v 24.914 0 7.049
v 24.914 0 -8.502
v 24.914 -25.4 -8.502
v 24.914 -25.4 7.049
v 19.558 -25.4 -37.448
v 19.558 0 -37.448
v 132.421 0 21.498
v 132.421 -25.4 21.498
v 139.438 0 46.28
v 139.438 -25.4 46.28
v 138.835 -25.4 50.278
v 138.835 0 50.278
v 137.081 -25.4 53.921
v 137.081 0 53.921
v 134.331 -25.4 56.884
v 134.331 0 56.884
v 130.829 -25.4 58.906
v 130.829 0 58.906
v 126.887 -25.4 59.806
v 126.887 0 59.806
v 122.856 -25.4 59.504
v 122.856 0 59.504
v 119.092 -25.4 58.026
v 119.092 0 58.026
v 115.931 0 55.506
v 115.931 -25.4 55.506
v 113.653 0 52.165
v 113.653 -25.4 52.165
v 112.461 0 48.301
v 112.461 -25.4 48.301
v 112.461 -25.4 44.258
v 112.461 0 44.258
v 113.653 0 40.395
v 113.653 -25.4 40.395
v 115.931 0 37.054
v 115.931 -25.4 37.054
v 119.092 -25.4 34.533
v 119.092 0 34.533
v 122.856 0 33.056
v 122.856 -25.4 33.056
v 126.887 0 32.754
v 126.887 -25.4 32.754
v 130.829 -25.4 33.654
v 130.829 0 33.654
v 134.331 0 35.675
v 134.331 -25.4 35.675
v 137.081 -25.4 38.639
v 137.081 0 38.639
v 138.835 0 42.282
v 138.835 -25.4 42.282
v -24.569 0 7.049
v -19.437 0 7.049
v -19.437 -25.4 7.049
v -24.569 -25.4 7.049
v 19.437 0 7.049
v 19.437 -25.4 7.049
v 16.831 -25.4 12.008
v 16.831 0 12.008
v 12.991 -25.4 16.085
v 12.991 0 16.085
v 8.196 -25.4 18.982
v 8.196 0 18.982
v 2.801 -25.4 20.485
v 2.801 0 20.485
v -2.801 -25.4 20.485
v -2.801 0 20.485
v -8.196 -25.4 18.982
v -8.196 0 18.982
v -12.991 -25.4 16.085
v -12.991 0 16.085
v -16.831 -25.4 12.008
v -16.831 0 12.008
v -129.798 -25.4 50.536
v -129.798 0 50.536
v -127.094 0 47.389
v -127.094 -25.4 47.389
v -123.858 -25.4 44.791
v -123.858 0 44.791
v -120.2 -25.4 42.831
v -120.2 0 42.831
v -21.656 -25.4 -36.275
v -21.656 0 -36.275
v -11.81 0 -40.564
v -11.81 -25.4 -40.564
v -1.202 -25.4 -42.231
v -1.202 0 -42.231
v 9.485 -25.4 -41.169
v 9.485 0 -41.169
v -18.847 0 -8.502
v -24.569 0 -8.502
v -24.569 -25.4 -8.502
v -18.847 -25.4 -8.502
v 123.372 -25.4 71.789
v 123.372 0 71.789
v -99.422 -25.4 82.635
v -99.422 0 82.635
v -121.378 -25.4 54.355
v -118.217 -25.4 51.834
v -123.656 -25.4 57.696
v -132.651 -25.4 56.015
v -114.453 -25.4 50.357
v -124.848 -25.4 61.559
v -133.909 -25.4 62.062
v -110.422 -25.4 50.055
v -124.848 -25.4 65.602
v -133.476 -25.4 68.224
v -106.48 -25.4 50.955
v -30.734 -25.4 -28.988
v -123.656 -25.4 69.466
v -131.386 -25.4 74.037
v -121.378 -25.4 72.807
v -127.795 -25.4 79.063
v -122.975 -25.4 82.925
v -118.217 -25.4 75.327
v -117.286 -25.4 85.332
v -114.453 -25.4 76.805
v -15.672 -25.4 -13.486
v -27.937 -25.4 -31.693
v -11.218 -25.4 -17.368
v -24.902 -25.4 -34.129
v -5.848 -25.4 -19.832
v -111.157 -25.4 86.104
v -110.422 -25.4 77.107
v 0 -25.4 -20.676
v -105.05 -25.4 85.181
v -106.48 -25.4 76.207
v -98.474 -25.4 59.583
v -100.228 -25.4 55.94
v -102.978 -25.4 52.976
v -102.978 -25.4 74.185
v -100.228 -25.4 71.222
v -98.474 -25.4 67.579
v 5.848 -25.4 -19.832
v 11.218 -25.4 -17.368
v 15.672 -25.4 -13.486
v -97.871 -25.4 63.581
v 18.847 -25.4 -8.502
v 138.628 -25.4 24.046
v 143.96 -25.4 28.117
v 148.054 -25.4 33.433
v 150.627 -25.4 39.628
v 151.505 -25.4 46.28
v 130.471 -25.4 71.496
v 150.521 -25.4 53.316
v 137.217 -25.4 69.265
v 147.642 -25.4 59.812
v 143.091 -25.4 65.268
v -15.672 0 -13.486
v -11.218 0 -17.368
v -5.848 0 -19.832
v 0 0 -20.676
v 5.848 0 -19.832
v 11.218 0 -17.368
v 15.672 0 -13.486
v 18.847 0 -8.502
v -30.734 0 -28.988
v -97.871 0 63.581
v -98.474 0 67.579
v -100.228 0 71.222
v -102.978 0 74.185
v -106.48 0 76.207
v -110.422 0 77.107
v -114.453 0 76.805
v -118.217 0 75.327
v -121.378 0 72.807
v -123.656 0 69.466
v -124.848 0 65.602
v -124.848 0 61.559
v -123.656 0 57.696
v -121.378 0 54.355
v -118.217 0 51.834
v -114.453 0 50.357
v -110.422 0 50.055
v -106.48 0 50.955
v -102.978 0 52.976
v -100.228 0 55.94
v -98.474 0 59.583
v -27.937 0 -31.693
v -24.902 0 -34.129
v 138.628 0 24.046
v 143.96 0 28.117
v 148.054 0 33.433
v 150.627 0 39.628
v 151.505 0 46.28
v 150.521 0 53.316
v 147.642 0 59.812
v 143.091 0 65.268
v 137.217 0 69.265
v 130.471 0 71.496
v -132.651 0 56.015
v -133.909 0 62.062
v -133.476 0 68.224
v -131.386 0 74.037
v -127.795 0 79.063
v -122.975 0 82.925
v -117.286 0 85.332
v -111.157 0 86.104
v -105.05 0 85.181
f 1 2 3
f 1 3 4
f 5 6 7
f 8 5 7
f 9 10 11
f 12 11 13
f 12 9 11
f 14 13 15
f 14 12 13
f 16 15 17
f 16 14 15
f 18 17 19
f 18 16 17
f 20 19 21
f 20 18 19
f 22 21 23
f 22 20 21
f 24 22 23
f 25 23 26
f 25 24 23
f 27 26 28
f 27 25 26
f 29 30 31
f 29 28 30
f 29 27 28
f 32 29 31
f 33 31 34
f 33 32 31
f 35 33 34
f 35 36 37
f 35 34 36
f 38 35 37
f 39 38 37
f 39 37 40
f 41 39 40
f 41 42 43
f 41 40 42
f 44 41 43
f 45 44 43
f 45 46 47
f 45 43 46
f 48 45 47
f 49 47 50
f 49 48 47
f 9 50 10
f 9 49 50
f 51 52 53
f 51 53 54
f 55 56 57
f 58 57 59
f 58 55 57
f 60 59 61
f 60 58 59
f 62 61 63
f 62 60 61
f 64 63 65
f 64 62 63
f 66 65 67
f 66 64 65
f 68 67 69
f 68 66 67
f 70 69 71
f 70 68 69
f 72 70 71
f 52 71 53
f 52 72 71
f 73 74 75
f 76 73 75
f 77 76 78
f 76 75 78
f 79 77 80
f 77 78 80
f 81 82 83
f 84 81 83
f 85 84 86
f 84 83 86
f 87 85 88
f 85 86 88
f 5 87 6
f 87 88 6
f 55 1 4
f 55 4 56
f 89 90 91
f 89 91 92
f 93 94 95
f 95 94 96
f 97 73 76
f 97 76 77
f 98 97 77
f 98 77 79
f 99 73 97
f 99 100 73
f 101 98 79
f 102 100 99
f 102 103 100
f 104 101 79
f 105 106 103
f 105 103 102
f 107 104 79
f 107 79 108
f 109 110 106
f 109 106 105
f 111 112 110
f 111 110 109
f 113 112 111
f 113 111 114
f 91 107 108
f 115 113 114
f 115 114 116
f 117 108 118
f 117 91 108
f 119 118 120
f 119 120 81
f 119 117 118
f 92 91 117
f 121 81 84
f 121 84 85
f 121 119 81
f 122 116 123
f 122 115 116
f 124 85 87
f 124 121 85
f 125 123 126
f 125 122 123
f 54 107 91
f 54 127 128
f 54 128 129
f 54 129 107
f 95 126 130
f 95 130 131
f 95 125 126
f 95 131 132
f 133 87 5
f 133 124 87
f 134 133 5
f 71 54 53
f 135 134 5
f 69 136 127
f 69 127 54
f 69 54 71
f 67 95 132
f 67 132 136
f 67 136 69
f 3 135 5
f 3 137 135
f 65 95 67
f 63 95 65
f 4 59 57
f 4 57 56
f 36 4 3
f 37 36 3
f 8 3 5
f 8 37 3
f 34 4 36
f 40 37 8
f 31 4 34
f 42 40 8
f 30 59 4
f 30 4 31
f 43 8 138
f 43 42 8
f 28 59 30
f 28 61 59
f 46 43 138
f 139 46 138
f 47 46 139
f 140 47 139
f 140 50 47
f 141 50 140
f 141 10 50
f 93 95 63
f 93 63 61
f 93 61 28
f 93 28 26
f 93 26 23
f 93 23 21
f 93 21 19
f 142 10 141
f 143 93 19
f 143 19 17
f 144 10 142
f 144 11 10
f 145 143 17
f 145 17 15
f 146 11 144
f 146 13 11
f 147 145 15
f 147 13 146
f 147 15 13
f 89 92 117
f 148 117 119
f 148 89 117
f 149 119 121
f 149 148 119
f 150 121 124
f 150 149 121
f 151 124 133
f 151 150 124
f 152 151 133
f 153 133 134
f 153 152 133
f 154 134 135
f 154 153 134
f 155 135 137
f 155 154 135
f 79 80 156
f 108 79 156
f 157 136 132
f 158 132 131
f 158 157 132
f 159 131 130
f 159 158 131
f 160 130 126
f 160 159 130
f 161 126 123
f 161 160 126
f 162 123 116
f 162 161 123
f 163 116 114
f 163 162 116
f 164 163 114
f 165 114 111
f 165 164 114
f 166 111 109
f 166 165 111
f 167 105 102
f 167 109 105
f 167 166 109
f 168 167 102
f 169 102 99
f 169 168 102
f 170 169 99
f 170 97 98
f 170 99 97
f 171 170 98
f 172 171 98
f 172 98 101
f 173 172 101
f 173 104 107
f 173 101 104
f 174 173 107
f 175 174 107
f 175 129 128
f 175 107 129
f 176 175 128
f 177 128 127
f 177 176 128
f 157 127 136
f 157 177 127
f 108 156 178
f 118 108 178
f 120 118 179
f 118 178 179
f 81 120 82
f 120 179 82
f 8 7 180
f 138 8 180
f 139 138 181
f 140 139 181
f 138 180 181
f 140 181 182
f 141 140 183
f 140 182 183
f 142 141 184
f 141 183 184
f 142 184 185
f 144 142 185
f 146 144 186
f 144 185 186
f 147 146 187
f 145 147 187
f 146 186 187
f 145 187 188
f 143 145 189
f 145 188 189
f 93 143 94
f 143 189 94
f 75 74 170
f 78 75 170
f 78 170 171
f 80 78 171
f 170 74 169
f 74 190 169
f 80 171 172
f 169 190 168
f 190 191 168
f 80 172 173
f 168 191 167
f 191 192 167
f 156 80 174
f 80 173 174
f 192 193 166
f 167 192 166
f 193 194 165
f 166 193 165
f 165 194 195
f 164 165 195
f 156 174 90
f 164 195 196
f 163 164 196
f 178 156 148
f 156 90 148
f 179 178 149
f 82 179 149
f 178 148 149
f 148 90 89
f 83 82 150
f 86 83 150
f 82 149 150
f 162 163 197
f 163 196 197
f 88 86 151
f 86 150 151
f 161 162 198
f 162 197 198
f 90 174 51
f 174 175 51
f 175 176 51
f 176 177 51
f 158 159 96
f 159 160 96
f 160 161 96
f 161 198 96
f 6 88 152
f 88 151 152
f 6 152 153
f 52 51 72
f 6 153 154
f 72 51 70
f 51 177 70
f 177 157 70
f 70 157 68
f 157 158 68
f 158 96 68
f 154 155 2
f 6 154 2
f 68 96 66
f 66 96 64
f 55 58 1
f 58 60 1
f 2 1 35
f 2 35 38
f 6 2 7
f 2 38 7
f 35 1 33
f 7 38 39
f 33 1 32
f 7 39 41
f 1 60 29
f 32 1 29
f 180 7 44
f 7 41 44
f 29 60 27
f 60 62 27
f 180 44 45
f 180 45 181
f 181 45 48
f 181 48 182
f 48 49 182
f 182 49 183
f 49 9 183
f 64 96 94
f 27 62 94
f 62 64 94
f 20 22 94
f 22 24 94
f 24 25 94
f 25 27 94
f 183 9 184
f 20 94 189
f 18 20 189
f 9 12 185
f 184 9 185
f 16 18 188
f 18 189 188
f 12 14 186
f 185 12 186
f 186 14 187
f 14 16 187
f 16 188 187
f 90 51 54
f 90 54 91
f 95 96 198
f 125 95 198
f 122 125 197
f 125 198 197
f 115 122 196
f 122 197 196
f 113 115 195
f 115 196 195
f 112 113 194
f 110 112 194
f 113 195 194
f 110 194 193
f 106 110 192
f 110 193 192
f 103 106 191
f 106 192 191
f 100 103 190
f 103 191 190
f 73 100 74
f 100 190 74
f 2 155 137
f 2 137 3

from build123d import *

# Parameters (mm, degrees)
F0_R     = 13.5638253362
F1_DEPTH = 25.4
F2_DEPTH = 41.656
F3_DEPTH = 26.162


with BuildPart() as f1:
    # F0 (on Front) → F1 (new body)
    with BuildSketch(Plane.XZ):
        with BuildLine():
            ThreePointArc((42.2479079596, 0), (36.1330221503, -21.892702831), (19.5584797538, -37.4479852152))
            Line((19.5584797538, -37.4479852152), (132.4212052928, 21.4983992089))
            ThreePointArc((132.4212052928, 21.4983992089), (100.6472035915, 41.7404632116), (123.3718206821, 71.7890924196))
            Line((123.3718206821, 71.7890924196), (-99.4221599354, 82.6346792182))
            ThreePointArc((-99.4221599354, 82.6346792182), (-91.712695746, 74.4613506675), (-88.9104630026, 63.580788672))
            ThreePointArc((-88.9104630026, 63.580788672), (-98.9866948233, 44.8085061449), (-120.2003748087, 42.8314324344))
            Line((-120.2003748087, 42.8314324344), (-30.734153315, -28.9878862108))
            ThreePointArc((-30.734153315, -28.9878862108), (-15.5953846777, 39.2641019726), (42.2479079596, 0))
        make_face()
        with BuildLine():
            Line((-30.734153315, -28.9878862108), (-21.6561091574, -36.2753175468))
            ThreePointArc((-21.6561091574, -36.2753175468), (-1.201582142, -42.2308172703), (19.5584797538, -37.4479852152))
            ThreePointArc((19.5584797538, -37.4479852152), (36.1330221503, -21.892702831), (42.2479079596, 0))
            ThreePointArc((42.2479079596, 0), (-15.5953846777, 39.2641019726), (-30.734153315, -28.9878862108))
        make_face()
        with BuildLine():
            ThreePointArc((-19.4369487029, 7.0494087413), (0, 20.6758104674), (19.4369487029, 7.0494087413))
            Line((19.4369487029, 7.0494087413), (24.9135568738, 7.0494087413))
            Line((24.9135568738, 7.0494087413), (24.9135568738, -8.5022896528))
            Line((24.9135568738, -8.5022896528), (18.8467559315, -8.5022896528))
            ThreePointArc((18.8467559315, -8.5022896528), (0, -20.6758104674), (-18.8467559315, -8.5022896528))
            Line((-18.8467559315, -8.5022896528), (-24.5691239834, -8.5022896528))
            Line((-24.5691239834, -8.5022896528), (-24.5691239834, 7.0494087413))
            Line((-24.5691239834, 7.0494087413), (-19.4369487029, 7.0494087413))
        make_face(mode=Mode.SUBTRACT)
        with BuildLine():
            ThreePointArc((123.3718206821, 71.7890924196), (100.6472035915, 41.7404632116), (132.4212052928, 21.4983992089))
            ThreePointArc((132.4212052928, 21.4983992089), (146.1814974644, 30.6406644058), (151.5054987025, 46.2797712983))
            ThreePointArc((151.5054987025, 46.2797712983), (143.0908574497, 65.2681184027), (123.3718206821, 71.7890924196))
        make_face()
        with Locations((125.873775364, 46.2797712983)):
            Circle(F0_R, mode=Mode.SUBTRACT)
        with BuildLine():
            Line((-129.7982639681, 50.536171143), (-120.2003748087, 42.8314324344))
            ThreePointArc((-120.2003748087, 42.8314324344), (-98.9866948233, 44.8085061449), (-88.9104630026, 63.580788672))
            ThreePointArc((-88.9104630026, 63.580788672), (-91.712695746, 74.4613506675), (-99.4221599354, 82.6346792182))
            ThreePointArc((-99.4221599354, 82.6346792182), (-127.7954989327, 79.063190443), (-129.7982639681, 50.536171143))
        make_face()
        with Locations((-111.4352047443, 63.580788672)):
            Circle(F0_R, mode=Mode.SUBTRACT)
        with BuildLine():
            ThreePointArc((18.8467559315, -8.5022896528), (20.2133754238, -4.3484011382), (20.6758104674, 0))
            ThreePointArc((20.6758104674, 0), (20.3637399061, 3.5787198156), (19.4369487029, 7.0494087413))
            Line((19.4369487029, 7.0494087413), (-19.4369487029, 7.0494087413))
            ThreePointArc((-19.4369487029, 7.0494087413), (-20.6609375603, -0.784090309), (-18.8467559315, -8.5022896528))
            Line((-18.8467559315, -8.5022896528), (18.8467559315, -8.5022896528))
        make_face()
        with Locations((-111.4352047443, 63.580788672)):
            Circle(F0_R)
        with Locations((125.873775364, 46.2797712983)):
            Circle(F0_R)
        with BuildLine():
            Line((-19.4369487029, 7.0494087413), (19.4369487029, 7.0494087413))
            ThreePointArc((19.4369487029, 7.0494087413), (0, 20.6758104674), (-19.4369487029, 7.0494087413))
        make_face()
        with BuildLine():
            ThreePointArc((-18.8467559315, -8.5022896528), (0, -20.6758104674), (18.8467559315, -8.5022896528))
            Line((18.8467559315, -8.5022896528), (-18.8467559315, -8.5022896528))
        make_face()
        with BuildLine():
            ThreePointArc((19.4369487029, 7.0494087413), (20.3637399061, 3.5787198156), (20.6758104674, 0))
            ThreePointArc((20.6758104674, 0), (20.2133754238, -4.3484011382), (18.8467559315, -8.5022896528))
            Line((18.8467559315, -8.5022896528), (24.9135568738, -8.5022896528))
            Line((24.9135568738, -8.5022896528), (24.9135568738, 7.0494087413))
            Line((24.9135568738, 7.0494087413), (19.4369487029, 7.0494087413))
        make_face()
        with BuildLine():
            ThreePointArc((-18.8467559315, -8.5022896528), (-20.6609375603, -0.784090309), (-19.4369487029, 7.0494087413))
            Line((-19.4369487029, 7.0494087413), (-24.5691239834, 7.0494087413))
            Line((-24.5691239834, 7.0494087413), (-24.5691239834, -8.5022896528))
            Line((-24.5691239834, -8.5022896528), (-18.8467559315, -8.5022896528))
        make_face()
        with BuildLine():
            ThreePointArc((-129.7982639681, 50.536171143), (-125.5357705386, 46.0155378963), (-120.2003748087, 42.8314324344))
            Line((-120.2003748087, 42.8314324344), (-129.7982639681, 50.536171143))
        make_face()
        with BuildLine():
            ThreePointArc((-30.734153315, -28.9878862108), (-26.4473356759, -32.9457760966), (-21.6561091574, -36.2753175468))
            Line((-21.6561091574, -36.2753175468), (-30.734153315, -28.9878862108))
        make_face()
    extrude(amount=F1_DEPTH)

    # F0 (on Front) → F2 (cut)
    with BuildSketch(Plane.XZ):
        with BuildLine():
            ThreePointArc((-18.8467559315, -8.5022896528), (0, -20.6758104674), (18.8467559315, -8.5022896528))
            Line((18.8467559315, -8.5022896528), (-18.8467559315, -8.5022896528))
        make_face()
        with BuildLine():
            Line((-19.4369487029, 7.0494087413), (19.4369487029, 7.0494087413))
            ThreePointArc((19.4369487029, 7.0494087413), (0, 20.6758104674), (-19.4369487029, 7.0494087413))
        make_face()
        with BuildLine():
            ThreePointArc((-18.8467559315, -8.5022896528), (-20.6609375603, -0.784090309), (-19.4369487029, 7.0494087413))
            Line((-19.4369487029, 7.0494087413), (-24.5691239834, 7.0494087413))
            Line((-24.5691239834, 7.0494087413), (-24.5691239834, -8.5022896528))
            Line((-24.5691239834, -8.5022896528), (-18.8467559315, -8.5022896528))
        make_face()
        with BuildLine():
            ThreePointArc((19.4369487029, 7.0494087413), (20.3637399061, 3.5787198156), (20.6758104674, 0))
            ThreePointArc((20.6758104674, 0), (20.2133754238, -4.3484011382), (18.8467559315, -8.5022896528))
            Line((18.8467559315, -8.5022896528), (24.9135568738, -8.5022896528))
            Line((24.9135568738, -8.5022896528), (24.9135568738, 7.0494087413))
            Line((24.9135568738, 7.0494087413), (19.4369487029, 7.0494087413))
        make_face()
        with BuildLine():
            ThreePointArc((18.8467559315, -8.5022896528), (20.2133754238, -4.3484011382), (20.6758104674, 0))
            ThreePointArc((20.6758104674, 0), (20.3637399061, 3.5787198156), (19.4369487029, 7.0494087413))
            Line((19.4369487029, 7.0494087413), (-19.4369487029, 7.0494087413))
            ThreePointArc((-19.4369487029, 7.0494087413), (-20.6609375603, -0.784090309), (-18.8467559315, -8.5022896528))
            Line((-18.8467559315, -8.5022896528), (18.8467559315, -8.5022896528))
        make_face()
    extrude(amount=F2_DEPTH, mode=Mode.SUBTRACT)

    # F0 (on Front) → F3 (cut)
    with BuildSketch(Plane.XZ):
        with Locations((-111.4352047443, 63.580788672)):
            Circle(F0_R)
        with Locations((125.873775364, 46.2797712983)):
            Circle(F0_R)
    extrude(amount=F3_DEPTH, mode=Mode.SUBTRACT)


solid = f1.part
